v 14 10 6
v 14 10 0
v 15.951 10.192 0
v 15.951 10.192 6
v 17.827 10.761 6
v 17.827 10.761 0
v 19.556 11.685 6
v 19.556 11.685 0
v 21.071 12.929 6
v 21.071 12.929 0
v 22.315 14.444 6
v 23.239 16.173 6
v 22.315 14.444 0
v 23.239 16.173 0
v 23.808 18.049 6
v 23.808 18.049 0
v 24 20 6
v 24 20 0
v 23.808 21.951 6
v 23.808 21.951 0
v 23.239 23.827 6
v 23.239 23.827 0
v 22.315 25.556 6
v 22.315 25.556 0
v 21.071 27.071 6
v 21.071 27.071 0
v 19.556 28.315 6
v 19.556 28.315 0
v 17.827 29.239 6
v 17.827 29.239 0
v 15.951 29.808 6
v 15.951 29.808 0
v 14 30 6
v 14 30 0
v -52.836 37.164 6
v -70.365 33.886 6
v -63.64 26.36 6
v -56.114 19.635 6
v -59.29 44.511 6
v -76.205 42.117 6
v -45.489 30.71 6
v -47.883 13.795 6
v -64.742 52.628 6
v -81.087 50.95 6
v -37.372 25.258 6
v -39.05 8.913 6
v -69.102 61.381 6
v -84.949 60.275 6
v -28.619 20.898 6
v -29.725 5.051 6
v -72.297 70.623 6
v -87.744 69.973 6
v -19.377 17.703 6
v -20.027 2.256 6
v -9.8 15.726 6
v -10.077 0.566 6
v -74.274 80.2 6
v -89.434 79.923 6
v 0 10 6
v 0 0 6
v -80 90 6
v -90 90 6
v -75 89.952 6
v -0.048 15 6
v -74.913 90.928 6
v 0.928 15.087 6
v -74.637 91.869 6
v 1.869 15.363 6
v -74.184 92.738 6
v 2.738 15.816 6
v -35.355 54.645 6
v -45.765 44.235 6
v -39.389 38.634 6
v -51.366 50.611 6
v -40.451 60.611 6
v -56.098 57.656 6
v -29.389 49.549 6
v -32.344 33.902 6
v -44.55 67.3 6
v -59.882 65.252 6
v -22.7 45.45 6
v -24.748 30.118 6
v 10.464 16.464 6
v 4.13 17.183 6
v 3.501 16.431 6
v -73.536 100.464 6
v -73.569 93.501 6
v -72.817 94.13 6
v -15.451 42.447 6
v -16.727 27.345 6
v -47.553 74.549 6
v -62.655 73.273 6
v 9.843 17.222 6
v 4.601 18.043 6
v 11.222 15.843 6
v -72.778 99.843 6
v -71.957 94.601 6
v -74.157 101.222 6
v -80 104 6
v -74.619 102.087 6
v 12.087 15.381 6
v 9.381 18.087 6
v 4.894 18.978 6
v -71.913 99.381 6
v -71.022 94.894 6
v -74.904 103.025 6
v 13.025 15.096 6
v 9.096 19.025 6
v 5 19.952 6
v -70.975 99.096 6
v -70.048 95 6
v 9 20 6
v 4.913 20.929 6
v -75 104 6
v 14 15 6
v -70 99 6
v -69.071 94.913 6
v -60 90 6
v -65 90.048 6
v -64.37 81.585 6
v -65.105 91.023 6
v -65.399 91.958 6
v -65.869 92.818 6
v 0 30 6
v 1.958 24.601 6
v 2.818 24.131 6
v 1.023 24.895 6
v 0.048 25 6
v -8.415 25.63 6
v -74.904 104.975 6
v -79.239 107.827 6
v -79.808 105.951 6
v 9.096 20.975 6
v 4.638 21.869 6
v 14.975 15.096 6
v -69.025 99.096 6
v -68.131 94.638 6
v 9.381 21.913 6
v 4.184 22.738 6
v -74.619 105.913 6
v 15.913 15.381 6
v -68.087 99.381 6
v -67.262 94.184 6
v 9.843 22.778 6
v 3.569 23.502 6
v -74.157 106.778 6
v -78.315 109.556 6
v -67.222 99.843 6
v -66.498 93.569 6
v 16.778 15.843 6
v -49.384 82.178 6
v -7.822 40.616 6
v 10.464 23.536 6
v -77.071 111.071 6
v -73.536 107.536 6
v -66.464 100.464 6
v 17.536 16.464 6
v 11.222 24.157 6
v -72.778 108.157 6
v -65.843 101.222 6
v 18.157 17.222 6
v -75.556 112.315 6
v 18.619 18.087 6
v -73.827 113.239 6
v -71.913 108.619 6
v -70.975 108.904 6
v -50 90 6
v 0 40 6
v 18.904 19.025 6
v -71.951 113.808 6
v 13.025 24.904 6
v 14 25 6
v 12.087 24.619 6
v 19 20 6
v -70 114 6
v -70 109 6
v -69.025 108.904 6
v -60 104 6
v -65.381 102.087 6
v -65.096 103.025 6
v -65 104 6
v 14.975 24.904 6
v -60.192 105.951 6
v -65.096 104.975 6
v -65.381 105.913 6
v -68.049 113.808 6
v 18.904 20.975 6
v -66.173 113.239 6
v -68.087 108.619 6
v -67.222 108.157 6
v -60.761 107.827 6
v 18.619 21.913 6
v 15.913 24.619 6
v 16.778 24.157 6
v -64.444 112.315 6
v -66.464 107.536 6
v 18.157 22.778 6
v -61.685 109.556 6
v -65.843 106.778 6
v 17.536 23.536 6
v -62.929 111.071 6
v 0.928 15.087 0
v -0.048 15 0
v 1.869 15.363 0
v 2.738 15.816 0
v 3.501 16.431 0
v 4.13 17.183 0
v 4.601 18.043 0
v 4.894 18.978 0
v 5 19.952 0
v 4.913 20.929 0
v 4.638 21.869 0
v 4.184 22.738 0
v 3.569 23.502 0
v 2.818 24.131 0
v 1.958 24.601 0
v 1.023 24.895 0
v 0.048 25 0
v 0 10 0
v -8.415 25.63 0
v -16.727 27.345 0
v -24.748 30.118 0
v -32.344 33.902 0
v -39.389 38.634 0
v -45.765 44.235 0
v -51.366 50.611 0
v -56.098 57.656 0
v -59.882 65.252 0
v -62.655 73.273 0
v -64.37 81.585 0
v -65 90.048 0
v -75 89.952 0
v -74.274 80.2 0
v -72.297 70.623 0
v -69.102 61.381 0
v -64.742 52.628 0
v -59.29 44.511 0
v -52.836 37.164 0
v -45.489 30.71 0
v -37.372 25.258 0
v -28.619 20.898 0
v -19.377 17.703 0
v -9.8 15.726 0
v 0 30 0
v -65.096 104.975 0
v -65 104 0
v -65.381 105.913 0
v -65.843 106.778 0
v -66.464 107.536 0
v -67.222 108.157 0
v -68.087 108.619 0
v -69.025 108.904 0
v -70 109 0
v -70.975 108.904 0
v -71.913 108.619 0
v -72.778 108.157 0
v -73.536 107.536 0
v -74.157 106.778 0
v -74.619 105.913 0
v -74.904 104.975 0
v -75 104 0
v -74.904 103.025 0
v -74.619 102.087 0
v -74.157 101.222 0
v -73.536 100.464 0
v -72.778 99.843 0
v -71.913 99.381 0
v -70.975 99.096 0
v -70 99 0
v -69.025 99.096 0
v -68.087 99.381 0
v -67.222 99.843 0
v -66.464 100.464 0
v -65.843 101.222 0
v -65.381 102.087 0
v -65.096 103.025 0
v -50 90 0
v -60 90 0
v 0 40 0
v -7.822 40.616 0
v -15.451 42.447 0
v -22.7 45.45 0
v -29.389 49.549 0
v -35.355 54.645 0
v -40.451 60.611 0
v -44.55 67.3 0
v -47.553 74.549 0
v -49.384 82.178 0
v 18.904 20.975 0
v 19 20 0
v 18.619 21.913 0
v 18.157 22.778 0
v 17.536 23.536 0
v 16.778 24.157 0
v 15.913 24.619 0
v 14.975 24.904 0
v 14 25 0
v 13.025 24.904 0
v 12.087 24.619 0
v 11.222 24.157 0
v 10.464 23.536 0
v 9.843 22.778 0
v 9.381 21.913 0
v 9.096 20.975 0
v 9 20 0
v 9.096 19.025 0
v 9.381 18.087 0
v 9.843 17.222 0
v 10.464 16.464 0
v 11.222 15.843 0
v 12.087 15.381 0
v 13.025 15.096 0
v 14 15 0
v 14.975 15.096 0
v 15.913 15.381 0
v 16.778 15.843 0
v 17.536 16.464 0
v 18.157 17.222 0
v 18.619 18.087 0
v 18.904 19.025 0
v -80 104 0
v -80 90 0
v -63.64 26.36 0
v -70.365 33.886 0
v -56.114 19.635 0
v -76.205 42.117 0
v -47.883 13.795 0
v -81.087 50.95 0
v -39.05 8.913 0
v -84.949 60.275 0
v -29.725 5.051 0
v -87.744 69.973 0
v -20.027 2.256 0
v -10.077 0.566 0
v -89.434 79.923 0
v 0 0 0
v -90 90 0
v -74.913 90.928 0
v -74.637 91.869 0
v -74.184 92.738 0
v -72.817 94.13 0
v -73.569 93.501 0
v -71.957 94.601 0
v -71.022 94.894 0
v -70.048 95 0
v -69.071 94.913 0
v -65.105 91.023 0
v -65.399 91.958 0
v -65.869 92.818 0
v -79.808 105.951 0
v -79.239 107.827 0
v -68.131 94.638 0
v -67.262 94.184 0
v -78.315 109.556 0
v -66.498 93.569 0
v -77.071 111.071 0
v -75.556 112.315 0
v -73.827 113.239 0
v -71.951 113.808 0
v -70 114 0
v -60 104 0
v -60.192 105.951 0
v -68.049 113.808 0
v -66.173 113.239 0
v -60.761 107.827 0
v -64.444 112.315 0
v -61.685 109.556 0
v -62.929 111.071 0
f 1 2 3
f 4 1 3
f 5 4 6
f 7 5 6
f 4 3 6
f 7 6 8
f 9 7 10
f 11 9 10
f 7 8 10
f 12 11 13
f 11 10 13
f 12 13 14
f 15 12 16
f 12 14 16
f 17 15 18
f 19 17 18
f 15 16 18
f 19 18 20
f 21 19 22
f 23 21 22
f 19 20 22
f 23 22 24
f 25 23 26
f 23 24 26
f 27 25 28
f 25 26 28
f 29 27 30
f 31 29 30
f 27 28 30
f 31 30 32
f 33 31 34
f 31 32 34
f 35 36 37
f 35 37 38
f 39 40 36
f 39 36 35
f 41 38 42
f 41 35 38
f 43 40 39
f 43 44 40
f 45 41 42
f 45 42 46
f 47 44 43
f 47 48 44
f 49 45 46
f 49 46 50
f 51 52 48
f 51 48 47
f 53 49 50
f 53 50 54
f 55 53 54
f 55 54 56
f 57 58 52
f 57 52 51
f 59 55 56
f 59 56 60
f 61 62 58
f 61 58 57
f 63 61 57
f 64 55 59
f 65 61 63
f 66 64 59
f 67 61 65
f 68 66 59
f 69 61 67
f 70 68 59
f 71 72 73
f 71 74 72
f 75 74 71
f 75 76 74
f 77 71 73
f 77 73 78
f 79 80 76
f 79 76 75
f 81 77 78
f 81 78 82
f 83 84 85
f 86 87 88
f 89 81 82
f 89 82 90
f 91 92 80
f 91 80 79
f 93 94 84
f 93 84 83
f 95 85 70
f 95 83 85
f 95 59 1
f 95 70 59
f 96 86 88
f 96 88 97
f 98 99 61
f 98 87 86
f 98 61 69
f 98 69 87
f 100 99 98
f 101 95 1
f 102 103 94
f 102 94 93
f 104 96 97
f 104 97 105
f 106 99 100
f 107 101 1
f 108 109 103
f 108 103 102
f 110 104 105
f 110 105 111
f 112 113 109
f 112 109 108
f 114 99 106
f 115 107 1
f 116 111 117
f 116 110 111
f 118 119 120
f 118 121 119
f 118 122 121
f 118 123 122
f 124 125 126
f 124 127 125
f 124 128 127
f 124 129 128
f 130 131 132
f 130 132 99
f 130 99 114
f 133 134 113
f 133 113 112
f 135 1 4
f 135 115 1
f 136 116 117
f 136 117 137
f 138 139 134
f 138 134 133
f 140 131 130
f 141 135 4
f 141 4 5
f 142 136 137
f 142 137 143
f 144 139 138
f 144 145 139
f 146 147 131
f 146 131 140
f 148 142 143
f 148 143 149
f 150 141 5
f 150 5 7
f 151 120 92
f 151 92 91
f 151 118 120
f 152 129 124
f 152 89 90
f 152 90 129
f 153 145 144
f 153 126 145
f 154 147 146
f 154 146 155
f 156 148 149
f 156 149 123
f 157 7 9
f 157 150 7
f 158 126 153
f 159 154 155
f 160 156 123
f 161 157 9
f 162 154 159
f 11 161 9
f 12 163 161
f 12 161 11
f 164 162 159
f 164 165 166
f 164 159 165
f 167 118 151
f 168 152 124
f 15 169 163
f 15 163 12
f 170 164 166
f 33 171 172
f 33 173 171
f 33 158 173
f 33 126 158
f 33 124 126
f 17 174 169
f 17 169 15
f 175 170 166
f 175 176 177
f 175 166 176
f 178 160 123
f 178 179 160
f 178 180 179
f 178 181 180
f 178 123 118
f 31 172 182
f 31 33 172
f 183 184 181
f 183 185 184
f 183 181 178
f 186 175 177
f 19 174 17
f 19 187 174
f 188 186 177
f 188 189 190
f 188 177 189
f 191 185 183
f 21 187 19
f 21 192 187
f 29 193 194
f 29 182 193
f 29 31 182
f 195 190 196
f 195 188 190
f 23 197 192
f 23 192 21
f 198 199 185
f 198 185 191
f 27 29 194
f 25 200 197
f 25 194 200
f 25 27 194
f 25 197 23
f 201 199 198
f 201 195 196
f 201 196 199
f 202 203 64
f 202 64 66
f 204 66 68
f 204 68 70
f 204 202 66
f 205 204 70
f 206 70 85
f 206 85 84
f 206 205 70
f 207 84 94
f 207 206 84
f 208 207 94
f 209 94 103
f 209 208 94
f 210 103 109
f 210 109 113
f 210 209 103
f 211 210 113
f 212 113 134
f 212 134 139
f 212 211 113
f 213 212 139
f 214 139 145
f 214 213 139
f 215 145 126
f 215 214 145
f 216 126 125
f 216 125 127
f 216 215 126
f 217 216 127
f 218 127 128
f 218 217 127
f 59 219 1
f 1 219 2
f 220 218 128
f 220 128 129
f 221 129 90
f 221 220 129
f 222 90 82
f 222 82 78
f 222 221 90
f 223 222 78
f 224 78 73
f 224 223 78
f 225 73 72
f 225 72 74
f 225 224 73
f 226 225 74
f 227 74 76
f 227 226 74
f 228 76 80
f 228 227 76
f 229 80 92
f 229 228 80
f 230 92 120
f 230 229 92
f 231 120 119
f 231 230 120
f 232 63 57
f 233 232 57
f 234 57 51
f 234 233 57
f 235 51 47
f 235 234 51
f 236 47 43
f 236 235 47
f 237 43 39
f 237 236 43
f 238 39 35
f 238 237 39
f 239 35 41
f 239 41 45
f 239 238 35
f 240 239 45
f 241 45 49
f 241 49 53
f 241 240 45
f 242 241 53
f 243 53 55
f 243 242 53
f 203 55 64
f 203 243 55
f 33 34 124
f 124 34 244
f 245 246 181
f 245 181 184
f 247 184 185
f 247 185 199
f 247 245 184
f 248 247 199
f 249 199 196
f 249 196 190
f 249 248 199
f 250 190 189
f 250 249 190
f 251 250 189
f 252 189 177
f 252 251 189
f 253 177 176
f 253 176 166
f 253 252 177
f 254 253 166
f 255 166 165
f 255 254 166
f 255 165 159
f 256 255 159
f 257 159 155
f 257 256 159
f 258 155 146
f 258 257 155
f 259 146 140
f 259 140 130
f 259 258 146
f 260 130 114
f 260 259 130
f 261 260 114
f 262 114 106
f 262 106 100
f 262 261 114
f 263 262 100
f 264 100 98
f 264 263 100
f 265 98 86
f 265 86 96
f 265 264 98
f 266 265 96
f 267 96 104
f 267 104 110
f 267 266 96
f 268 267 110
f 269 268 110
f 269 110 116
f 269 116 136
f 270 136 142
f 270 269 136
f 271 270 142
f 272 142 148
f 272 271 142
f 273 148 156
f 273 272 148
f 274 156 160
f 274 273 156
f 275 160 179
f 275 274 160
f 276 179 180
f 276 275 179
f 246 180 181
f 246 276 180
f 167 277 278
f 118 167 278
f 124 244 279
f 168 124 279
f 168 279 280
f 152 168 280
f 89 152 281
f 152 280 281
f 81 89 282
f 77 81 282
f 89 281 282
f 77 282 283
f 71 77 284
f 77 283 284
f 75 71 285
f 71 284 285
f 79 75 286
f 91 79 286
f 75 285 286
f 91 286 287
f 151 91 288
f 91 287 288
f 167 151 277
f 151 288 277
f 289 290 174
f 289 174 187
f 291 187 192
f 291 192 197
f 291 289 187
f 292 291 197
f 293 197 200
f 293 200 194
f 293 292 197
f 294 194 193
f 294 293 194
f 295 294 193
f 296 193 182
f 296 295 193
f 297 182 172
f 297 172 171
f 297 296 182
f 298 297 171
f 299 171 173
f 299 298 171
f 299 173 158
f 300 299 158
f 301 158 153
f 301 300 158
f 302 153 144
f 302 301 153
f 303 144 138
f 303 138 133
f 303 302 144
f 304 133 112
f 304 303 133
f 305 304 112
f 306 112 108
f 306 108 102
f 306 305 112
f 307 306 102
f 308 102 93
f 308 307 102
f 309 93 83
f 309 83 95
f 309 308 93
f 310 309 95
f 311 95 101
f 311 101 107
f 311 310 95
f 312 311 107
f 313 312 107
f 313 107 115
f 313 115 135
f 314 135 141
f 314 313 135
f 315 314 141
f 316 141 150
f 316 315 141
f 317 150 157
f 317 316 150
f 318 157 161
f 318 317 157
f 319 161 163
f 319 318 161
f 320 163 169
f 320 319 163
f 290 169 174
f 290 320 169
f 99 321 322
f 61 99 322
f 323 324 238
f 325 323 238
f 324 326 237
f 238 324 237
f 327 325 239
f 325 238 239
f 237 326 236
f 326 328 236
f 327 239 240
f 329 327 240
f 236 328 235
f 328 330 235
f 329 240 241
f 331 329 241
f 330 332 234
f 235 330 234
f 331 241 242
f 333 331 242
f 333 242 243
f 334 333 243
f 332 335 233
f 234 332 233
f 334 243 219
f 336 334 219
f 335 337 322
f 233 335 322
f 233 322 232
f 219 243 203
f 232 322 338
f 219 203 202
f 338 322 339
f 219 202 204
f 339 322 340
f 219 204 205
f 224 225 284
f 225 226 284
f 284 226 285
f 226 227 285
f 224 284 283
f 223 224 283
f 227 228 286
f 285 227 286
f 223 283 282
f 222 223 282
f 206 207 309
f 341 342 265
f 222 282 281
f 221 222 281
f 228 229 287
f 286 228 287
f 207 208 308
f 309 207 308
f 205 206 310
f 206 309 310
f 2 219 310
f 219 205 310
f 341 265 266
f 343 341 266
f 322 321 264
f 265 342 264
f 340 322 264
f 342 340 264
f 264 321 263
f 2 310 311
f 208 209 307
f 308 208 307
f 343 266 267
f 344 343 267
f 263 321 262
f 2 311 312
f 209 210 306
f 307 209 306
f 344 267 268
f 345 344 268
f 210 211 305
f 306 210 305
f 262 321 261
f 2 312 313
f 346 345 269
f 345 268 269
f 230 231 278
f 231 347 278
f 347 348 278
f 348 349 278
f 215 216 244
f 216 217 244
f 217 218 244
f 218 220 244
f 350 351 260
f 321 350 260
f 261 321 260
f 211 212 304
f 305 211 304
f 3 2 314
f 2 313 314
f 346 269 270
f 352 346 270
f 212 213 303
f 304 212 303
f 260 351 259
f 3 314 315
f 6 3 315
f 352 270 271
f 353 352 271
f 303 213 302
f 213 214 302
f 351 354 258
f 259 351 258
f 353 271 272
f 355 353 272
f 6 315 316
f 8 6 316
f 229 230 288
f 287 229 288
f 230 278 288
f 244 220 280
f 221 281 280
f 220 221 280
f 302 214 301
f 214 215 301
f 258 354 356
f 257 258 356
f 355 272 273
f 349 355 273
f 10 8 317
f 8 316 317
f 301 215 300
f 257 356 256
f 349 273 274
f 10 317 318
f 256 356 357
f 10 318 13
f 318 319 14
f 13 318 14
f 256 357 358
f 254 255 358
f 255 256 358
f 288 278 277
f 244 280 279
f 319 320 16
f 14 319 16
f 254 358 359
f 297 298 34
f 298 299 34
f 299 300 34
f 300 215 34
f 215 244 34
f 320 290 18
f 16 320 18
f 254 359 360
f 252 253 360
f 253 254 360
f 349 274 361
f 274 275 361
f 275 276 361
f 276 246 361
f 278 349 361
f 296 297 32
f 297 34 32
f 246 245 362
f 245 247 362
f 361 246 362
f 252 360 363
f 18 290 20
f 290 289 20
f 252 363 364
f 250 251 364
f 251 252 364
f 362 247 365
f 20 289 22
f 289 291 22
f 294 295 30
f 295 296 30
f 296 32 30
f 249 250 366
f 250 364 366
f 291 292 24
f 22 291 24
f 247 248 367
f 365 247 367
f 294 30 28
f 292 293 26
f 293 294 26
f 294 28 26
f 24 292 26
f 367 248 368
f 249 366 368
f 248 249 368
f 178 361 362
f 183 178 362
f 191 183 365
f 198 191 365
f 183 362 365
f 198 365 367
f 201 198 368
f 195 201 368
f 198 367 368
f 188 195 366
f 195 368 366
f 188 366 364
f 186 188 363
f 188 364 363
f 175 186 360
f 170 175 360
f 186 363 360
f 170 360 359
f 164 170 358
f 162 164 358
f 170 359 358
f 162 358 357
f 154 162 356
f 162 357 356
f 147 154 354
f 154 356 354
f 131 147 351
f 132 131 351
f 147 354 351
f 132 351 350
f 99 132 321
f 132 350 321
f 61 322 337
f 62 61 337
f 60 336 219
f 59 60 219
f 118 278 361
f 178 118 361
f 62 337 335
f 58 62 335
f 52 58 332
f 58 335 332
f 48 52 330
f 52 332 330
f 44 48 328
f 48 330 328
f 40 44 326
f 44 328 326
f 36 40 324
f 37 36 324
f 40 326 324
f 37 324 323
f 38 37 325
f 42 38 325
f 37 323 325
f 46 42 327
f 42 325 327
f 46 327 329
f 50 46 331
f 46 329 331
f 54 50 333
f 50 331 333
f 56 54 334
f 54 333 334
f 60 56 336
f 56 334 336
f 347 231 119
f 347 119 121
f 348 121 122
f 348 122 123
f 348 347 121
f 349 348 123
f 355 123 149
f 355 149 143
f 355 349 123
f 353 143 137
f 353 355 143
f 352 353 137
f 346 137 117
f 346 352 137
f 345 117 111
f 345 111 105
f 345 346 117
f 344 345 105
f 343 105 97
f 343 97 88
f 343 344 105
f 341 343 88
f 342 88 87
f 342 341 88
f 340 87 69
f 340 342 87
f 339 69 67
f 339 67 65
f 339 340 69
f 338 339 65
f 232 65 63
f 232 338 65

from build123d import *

# Parameters (mm, degrees)
SALIENTE_EXTRUIR1_DEPTH = 6
CROQUIS3_R              = 5
CORTAR_EXTRUIR1_DEPTH   = 6
CORTAR_EXTRUIR3_DEPTH   = 6


with BuildPart() as part:
    # cuadrado → Saliente-Extruir1 (new body)
    with BuildSketch(Plane.XY):
        with BuildLine():
            Line((-50, 90), (-60, 90))
            Line((-60, 90), (-60, 104))
            ThreePointArc((-60, 104), (-70, 114), (-80, 104))
            Line((-80, 104), (-80, 90))
            Line((-80, 90), (-90, 90))
            ThreePointArc((-90, 90), (-63.639610307, 26.360389693), (0, 0))
            Line((0, 0), (0, 10))
            Line((0, 10), (14, 10))
            ThreePointArc((14, 10), (24, 20), (14, 30))
            Line((14, 30), (0, 30))
            Line((0, 30), (0, 40))
            ThreePointArc((0, 40), (-35.355339059, 54.644660941), (-50, 90))
        make_face()
    extrude(amount=SALIENTE_EXTRUIR1_DEPTH)

    # Croquis3 → Cortar-Extruir1 (cut)
    with BuildSketch(Plane.XY):
        with Locations((-70, 104)):
            Circle(CROQUIS3_R)
        with Locations((14, 20)):
            Circle(CROQUIS3_R)
    extrude(amount=CORTAR_EXTRUIR1_DEPTH, mode=Mode.SUBTRACT)

    # Croquis4 → Cortar-Extruir3 (cut)
    with BuildSketch(Plane.XY):
        with BuildLine():
            ThreePointArc((-74.999538142, 89.951945487), (-52.836185081, 37.163814919), (-0.048054513, 15.000461858))
            ThreePointArc((-0.048054513, 15.000461858), (4.999769071, 19.952176416), (0.048054513, 25))
            ThreePointArc((0.048054513, 25), (-45.765117269, 44.234882731), (-65, 90.048054513))
            ThreePointArc((-65, 90.048054513), (-70.047823584, 94.999769071), (-74.999538142, 89.951945487))
        make_face()
    extrude(amount=CORTAR_EXTRUIR3_DEPTH, mode=Mode.SUBTRACT)


solid = part.part
